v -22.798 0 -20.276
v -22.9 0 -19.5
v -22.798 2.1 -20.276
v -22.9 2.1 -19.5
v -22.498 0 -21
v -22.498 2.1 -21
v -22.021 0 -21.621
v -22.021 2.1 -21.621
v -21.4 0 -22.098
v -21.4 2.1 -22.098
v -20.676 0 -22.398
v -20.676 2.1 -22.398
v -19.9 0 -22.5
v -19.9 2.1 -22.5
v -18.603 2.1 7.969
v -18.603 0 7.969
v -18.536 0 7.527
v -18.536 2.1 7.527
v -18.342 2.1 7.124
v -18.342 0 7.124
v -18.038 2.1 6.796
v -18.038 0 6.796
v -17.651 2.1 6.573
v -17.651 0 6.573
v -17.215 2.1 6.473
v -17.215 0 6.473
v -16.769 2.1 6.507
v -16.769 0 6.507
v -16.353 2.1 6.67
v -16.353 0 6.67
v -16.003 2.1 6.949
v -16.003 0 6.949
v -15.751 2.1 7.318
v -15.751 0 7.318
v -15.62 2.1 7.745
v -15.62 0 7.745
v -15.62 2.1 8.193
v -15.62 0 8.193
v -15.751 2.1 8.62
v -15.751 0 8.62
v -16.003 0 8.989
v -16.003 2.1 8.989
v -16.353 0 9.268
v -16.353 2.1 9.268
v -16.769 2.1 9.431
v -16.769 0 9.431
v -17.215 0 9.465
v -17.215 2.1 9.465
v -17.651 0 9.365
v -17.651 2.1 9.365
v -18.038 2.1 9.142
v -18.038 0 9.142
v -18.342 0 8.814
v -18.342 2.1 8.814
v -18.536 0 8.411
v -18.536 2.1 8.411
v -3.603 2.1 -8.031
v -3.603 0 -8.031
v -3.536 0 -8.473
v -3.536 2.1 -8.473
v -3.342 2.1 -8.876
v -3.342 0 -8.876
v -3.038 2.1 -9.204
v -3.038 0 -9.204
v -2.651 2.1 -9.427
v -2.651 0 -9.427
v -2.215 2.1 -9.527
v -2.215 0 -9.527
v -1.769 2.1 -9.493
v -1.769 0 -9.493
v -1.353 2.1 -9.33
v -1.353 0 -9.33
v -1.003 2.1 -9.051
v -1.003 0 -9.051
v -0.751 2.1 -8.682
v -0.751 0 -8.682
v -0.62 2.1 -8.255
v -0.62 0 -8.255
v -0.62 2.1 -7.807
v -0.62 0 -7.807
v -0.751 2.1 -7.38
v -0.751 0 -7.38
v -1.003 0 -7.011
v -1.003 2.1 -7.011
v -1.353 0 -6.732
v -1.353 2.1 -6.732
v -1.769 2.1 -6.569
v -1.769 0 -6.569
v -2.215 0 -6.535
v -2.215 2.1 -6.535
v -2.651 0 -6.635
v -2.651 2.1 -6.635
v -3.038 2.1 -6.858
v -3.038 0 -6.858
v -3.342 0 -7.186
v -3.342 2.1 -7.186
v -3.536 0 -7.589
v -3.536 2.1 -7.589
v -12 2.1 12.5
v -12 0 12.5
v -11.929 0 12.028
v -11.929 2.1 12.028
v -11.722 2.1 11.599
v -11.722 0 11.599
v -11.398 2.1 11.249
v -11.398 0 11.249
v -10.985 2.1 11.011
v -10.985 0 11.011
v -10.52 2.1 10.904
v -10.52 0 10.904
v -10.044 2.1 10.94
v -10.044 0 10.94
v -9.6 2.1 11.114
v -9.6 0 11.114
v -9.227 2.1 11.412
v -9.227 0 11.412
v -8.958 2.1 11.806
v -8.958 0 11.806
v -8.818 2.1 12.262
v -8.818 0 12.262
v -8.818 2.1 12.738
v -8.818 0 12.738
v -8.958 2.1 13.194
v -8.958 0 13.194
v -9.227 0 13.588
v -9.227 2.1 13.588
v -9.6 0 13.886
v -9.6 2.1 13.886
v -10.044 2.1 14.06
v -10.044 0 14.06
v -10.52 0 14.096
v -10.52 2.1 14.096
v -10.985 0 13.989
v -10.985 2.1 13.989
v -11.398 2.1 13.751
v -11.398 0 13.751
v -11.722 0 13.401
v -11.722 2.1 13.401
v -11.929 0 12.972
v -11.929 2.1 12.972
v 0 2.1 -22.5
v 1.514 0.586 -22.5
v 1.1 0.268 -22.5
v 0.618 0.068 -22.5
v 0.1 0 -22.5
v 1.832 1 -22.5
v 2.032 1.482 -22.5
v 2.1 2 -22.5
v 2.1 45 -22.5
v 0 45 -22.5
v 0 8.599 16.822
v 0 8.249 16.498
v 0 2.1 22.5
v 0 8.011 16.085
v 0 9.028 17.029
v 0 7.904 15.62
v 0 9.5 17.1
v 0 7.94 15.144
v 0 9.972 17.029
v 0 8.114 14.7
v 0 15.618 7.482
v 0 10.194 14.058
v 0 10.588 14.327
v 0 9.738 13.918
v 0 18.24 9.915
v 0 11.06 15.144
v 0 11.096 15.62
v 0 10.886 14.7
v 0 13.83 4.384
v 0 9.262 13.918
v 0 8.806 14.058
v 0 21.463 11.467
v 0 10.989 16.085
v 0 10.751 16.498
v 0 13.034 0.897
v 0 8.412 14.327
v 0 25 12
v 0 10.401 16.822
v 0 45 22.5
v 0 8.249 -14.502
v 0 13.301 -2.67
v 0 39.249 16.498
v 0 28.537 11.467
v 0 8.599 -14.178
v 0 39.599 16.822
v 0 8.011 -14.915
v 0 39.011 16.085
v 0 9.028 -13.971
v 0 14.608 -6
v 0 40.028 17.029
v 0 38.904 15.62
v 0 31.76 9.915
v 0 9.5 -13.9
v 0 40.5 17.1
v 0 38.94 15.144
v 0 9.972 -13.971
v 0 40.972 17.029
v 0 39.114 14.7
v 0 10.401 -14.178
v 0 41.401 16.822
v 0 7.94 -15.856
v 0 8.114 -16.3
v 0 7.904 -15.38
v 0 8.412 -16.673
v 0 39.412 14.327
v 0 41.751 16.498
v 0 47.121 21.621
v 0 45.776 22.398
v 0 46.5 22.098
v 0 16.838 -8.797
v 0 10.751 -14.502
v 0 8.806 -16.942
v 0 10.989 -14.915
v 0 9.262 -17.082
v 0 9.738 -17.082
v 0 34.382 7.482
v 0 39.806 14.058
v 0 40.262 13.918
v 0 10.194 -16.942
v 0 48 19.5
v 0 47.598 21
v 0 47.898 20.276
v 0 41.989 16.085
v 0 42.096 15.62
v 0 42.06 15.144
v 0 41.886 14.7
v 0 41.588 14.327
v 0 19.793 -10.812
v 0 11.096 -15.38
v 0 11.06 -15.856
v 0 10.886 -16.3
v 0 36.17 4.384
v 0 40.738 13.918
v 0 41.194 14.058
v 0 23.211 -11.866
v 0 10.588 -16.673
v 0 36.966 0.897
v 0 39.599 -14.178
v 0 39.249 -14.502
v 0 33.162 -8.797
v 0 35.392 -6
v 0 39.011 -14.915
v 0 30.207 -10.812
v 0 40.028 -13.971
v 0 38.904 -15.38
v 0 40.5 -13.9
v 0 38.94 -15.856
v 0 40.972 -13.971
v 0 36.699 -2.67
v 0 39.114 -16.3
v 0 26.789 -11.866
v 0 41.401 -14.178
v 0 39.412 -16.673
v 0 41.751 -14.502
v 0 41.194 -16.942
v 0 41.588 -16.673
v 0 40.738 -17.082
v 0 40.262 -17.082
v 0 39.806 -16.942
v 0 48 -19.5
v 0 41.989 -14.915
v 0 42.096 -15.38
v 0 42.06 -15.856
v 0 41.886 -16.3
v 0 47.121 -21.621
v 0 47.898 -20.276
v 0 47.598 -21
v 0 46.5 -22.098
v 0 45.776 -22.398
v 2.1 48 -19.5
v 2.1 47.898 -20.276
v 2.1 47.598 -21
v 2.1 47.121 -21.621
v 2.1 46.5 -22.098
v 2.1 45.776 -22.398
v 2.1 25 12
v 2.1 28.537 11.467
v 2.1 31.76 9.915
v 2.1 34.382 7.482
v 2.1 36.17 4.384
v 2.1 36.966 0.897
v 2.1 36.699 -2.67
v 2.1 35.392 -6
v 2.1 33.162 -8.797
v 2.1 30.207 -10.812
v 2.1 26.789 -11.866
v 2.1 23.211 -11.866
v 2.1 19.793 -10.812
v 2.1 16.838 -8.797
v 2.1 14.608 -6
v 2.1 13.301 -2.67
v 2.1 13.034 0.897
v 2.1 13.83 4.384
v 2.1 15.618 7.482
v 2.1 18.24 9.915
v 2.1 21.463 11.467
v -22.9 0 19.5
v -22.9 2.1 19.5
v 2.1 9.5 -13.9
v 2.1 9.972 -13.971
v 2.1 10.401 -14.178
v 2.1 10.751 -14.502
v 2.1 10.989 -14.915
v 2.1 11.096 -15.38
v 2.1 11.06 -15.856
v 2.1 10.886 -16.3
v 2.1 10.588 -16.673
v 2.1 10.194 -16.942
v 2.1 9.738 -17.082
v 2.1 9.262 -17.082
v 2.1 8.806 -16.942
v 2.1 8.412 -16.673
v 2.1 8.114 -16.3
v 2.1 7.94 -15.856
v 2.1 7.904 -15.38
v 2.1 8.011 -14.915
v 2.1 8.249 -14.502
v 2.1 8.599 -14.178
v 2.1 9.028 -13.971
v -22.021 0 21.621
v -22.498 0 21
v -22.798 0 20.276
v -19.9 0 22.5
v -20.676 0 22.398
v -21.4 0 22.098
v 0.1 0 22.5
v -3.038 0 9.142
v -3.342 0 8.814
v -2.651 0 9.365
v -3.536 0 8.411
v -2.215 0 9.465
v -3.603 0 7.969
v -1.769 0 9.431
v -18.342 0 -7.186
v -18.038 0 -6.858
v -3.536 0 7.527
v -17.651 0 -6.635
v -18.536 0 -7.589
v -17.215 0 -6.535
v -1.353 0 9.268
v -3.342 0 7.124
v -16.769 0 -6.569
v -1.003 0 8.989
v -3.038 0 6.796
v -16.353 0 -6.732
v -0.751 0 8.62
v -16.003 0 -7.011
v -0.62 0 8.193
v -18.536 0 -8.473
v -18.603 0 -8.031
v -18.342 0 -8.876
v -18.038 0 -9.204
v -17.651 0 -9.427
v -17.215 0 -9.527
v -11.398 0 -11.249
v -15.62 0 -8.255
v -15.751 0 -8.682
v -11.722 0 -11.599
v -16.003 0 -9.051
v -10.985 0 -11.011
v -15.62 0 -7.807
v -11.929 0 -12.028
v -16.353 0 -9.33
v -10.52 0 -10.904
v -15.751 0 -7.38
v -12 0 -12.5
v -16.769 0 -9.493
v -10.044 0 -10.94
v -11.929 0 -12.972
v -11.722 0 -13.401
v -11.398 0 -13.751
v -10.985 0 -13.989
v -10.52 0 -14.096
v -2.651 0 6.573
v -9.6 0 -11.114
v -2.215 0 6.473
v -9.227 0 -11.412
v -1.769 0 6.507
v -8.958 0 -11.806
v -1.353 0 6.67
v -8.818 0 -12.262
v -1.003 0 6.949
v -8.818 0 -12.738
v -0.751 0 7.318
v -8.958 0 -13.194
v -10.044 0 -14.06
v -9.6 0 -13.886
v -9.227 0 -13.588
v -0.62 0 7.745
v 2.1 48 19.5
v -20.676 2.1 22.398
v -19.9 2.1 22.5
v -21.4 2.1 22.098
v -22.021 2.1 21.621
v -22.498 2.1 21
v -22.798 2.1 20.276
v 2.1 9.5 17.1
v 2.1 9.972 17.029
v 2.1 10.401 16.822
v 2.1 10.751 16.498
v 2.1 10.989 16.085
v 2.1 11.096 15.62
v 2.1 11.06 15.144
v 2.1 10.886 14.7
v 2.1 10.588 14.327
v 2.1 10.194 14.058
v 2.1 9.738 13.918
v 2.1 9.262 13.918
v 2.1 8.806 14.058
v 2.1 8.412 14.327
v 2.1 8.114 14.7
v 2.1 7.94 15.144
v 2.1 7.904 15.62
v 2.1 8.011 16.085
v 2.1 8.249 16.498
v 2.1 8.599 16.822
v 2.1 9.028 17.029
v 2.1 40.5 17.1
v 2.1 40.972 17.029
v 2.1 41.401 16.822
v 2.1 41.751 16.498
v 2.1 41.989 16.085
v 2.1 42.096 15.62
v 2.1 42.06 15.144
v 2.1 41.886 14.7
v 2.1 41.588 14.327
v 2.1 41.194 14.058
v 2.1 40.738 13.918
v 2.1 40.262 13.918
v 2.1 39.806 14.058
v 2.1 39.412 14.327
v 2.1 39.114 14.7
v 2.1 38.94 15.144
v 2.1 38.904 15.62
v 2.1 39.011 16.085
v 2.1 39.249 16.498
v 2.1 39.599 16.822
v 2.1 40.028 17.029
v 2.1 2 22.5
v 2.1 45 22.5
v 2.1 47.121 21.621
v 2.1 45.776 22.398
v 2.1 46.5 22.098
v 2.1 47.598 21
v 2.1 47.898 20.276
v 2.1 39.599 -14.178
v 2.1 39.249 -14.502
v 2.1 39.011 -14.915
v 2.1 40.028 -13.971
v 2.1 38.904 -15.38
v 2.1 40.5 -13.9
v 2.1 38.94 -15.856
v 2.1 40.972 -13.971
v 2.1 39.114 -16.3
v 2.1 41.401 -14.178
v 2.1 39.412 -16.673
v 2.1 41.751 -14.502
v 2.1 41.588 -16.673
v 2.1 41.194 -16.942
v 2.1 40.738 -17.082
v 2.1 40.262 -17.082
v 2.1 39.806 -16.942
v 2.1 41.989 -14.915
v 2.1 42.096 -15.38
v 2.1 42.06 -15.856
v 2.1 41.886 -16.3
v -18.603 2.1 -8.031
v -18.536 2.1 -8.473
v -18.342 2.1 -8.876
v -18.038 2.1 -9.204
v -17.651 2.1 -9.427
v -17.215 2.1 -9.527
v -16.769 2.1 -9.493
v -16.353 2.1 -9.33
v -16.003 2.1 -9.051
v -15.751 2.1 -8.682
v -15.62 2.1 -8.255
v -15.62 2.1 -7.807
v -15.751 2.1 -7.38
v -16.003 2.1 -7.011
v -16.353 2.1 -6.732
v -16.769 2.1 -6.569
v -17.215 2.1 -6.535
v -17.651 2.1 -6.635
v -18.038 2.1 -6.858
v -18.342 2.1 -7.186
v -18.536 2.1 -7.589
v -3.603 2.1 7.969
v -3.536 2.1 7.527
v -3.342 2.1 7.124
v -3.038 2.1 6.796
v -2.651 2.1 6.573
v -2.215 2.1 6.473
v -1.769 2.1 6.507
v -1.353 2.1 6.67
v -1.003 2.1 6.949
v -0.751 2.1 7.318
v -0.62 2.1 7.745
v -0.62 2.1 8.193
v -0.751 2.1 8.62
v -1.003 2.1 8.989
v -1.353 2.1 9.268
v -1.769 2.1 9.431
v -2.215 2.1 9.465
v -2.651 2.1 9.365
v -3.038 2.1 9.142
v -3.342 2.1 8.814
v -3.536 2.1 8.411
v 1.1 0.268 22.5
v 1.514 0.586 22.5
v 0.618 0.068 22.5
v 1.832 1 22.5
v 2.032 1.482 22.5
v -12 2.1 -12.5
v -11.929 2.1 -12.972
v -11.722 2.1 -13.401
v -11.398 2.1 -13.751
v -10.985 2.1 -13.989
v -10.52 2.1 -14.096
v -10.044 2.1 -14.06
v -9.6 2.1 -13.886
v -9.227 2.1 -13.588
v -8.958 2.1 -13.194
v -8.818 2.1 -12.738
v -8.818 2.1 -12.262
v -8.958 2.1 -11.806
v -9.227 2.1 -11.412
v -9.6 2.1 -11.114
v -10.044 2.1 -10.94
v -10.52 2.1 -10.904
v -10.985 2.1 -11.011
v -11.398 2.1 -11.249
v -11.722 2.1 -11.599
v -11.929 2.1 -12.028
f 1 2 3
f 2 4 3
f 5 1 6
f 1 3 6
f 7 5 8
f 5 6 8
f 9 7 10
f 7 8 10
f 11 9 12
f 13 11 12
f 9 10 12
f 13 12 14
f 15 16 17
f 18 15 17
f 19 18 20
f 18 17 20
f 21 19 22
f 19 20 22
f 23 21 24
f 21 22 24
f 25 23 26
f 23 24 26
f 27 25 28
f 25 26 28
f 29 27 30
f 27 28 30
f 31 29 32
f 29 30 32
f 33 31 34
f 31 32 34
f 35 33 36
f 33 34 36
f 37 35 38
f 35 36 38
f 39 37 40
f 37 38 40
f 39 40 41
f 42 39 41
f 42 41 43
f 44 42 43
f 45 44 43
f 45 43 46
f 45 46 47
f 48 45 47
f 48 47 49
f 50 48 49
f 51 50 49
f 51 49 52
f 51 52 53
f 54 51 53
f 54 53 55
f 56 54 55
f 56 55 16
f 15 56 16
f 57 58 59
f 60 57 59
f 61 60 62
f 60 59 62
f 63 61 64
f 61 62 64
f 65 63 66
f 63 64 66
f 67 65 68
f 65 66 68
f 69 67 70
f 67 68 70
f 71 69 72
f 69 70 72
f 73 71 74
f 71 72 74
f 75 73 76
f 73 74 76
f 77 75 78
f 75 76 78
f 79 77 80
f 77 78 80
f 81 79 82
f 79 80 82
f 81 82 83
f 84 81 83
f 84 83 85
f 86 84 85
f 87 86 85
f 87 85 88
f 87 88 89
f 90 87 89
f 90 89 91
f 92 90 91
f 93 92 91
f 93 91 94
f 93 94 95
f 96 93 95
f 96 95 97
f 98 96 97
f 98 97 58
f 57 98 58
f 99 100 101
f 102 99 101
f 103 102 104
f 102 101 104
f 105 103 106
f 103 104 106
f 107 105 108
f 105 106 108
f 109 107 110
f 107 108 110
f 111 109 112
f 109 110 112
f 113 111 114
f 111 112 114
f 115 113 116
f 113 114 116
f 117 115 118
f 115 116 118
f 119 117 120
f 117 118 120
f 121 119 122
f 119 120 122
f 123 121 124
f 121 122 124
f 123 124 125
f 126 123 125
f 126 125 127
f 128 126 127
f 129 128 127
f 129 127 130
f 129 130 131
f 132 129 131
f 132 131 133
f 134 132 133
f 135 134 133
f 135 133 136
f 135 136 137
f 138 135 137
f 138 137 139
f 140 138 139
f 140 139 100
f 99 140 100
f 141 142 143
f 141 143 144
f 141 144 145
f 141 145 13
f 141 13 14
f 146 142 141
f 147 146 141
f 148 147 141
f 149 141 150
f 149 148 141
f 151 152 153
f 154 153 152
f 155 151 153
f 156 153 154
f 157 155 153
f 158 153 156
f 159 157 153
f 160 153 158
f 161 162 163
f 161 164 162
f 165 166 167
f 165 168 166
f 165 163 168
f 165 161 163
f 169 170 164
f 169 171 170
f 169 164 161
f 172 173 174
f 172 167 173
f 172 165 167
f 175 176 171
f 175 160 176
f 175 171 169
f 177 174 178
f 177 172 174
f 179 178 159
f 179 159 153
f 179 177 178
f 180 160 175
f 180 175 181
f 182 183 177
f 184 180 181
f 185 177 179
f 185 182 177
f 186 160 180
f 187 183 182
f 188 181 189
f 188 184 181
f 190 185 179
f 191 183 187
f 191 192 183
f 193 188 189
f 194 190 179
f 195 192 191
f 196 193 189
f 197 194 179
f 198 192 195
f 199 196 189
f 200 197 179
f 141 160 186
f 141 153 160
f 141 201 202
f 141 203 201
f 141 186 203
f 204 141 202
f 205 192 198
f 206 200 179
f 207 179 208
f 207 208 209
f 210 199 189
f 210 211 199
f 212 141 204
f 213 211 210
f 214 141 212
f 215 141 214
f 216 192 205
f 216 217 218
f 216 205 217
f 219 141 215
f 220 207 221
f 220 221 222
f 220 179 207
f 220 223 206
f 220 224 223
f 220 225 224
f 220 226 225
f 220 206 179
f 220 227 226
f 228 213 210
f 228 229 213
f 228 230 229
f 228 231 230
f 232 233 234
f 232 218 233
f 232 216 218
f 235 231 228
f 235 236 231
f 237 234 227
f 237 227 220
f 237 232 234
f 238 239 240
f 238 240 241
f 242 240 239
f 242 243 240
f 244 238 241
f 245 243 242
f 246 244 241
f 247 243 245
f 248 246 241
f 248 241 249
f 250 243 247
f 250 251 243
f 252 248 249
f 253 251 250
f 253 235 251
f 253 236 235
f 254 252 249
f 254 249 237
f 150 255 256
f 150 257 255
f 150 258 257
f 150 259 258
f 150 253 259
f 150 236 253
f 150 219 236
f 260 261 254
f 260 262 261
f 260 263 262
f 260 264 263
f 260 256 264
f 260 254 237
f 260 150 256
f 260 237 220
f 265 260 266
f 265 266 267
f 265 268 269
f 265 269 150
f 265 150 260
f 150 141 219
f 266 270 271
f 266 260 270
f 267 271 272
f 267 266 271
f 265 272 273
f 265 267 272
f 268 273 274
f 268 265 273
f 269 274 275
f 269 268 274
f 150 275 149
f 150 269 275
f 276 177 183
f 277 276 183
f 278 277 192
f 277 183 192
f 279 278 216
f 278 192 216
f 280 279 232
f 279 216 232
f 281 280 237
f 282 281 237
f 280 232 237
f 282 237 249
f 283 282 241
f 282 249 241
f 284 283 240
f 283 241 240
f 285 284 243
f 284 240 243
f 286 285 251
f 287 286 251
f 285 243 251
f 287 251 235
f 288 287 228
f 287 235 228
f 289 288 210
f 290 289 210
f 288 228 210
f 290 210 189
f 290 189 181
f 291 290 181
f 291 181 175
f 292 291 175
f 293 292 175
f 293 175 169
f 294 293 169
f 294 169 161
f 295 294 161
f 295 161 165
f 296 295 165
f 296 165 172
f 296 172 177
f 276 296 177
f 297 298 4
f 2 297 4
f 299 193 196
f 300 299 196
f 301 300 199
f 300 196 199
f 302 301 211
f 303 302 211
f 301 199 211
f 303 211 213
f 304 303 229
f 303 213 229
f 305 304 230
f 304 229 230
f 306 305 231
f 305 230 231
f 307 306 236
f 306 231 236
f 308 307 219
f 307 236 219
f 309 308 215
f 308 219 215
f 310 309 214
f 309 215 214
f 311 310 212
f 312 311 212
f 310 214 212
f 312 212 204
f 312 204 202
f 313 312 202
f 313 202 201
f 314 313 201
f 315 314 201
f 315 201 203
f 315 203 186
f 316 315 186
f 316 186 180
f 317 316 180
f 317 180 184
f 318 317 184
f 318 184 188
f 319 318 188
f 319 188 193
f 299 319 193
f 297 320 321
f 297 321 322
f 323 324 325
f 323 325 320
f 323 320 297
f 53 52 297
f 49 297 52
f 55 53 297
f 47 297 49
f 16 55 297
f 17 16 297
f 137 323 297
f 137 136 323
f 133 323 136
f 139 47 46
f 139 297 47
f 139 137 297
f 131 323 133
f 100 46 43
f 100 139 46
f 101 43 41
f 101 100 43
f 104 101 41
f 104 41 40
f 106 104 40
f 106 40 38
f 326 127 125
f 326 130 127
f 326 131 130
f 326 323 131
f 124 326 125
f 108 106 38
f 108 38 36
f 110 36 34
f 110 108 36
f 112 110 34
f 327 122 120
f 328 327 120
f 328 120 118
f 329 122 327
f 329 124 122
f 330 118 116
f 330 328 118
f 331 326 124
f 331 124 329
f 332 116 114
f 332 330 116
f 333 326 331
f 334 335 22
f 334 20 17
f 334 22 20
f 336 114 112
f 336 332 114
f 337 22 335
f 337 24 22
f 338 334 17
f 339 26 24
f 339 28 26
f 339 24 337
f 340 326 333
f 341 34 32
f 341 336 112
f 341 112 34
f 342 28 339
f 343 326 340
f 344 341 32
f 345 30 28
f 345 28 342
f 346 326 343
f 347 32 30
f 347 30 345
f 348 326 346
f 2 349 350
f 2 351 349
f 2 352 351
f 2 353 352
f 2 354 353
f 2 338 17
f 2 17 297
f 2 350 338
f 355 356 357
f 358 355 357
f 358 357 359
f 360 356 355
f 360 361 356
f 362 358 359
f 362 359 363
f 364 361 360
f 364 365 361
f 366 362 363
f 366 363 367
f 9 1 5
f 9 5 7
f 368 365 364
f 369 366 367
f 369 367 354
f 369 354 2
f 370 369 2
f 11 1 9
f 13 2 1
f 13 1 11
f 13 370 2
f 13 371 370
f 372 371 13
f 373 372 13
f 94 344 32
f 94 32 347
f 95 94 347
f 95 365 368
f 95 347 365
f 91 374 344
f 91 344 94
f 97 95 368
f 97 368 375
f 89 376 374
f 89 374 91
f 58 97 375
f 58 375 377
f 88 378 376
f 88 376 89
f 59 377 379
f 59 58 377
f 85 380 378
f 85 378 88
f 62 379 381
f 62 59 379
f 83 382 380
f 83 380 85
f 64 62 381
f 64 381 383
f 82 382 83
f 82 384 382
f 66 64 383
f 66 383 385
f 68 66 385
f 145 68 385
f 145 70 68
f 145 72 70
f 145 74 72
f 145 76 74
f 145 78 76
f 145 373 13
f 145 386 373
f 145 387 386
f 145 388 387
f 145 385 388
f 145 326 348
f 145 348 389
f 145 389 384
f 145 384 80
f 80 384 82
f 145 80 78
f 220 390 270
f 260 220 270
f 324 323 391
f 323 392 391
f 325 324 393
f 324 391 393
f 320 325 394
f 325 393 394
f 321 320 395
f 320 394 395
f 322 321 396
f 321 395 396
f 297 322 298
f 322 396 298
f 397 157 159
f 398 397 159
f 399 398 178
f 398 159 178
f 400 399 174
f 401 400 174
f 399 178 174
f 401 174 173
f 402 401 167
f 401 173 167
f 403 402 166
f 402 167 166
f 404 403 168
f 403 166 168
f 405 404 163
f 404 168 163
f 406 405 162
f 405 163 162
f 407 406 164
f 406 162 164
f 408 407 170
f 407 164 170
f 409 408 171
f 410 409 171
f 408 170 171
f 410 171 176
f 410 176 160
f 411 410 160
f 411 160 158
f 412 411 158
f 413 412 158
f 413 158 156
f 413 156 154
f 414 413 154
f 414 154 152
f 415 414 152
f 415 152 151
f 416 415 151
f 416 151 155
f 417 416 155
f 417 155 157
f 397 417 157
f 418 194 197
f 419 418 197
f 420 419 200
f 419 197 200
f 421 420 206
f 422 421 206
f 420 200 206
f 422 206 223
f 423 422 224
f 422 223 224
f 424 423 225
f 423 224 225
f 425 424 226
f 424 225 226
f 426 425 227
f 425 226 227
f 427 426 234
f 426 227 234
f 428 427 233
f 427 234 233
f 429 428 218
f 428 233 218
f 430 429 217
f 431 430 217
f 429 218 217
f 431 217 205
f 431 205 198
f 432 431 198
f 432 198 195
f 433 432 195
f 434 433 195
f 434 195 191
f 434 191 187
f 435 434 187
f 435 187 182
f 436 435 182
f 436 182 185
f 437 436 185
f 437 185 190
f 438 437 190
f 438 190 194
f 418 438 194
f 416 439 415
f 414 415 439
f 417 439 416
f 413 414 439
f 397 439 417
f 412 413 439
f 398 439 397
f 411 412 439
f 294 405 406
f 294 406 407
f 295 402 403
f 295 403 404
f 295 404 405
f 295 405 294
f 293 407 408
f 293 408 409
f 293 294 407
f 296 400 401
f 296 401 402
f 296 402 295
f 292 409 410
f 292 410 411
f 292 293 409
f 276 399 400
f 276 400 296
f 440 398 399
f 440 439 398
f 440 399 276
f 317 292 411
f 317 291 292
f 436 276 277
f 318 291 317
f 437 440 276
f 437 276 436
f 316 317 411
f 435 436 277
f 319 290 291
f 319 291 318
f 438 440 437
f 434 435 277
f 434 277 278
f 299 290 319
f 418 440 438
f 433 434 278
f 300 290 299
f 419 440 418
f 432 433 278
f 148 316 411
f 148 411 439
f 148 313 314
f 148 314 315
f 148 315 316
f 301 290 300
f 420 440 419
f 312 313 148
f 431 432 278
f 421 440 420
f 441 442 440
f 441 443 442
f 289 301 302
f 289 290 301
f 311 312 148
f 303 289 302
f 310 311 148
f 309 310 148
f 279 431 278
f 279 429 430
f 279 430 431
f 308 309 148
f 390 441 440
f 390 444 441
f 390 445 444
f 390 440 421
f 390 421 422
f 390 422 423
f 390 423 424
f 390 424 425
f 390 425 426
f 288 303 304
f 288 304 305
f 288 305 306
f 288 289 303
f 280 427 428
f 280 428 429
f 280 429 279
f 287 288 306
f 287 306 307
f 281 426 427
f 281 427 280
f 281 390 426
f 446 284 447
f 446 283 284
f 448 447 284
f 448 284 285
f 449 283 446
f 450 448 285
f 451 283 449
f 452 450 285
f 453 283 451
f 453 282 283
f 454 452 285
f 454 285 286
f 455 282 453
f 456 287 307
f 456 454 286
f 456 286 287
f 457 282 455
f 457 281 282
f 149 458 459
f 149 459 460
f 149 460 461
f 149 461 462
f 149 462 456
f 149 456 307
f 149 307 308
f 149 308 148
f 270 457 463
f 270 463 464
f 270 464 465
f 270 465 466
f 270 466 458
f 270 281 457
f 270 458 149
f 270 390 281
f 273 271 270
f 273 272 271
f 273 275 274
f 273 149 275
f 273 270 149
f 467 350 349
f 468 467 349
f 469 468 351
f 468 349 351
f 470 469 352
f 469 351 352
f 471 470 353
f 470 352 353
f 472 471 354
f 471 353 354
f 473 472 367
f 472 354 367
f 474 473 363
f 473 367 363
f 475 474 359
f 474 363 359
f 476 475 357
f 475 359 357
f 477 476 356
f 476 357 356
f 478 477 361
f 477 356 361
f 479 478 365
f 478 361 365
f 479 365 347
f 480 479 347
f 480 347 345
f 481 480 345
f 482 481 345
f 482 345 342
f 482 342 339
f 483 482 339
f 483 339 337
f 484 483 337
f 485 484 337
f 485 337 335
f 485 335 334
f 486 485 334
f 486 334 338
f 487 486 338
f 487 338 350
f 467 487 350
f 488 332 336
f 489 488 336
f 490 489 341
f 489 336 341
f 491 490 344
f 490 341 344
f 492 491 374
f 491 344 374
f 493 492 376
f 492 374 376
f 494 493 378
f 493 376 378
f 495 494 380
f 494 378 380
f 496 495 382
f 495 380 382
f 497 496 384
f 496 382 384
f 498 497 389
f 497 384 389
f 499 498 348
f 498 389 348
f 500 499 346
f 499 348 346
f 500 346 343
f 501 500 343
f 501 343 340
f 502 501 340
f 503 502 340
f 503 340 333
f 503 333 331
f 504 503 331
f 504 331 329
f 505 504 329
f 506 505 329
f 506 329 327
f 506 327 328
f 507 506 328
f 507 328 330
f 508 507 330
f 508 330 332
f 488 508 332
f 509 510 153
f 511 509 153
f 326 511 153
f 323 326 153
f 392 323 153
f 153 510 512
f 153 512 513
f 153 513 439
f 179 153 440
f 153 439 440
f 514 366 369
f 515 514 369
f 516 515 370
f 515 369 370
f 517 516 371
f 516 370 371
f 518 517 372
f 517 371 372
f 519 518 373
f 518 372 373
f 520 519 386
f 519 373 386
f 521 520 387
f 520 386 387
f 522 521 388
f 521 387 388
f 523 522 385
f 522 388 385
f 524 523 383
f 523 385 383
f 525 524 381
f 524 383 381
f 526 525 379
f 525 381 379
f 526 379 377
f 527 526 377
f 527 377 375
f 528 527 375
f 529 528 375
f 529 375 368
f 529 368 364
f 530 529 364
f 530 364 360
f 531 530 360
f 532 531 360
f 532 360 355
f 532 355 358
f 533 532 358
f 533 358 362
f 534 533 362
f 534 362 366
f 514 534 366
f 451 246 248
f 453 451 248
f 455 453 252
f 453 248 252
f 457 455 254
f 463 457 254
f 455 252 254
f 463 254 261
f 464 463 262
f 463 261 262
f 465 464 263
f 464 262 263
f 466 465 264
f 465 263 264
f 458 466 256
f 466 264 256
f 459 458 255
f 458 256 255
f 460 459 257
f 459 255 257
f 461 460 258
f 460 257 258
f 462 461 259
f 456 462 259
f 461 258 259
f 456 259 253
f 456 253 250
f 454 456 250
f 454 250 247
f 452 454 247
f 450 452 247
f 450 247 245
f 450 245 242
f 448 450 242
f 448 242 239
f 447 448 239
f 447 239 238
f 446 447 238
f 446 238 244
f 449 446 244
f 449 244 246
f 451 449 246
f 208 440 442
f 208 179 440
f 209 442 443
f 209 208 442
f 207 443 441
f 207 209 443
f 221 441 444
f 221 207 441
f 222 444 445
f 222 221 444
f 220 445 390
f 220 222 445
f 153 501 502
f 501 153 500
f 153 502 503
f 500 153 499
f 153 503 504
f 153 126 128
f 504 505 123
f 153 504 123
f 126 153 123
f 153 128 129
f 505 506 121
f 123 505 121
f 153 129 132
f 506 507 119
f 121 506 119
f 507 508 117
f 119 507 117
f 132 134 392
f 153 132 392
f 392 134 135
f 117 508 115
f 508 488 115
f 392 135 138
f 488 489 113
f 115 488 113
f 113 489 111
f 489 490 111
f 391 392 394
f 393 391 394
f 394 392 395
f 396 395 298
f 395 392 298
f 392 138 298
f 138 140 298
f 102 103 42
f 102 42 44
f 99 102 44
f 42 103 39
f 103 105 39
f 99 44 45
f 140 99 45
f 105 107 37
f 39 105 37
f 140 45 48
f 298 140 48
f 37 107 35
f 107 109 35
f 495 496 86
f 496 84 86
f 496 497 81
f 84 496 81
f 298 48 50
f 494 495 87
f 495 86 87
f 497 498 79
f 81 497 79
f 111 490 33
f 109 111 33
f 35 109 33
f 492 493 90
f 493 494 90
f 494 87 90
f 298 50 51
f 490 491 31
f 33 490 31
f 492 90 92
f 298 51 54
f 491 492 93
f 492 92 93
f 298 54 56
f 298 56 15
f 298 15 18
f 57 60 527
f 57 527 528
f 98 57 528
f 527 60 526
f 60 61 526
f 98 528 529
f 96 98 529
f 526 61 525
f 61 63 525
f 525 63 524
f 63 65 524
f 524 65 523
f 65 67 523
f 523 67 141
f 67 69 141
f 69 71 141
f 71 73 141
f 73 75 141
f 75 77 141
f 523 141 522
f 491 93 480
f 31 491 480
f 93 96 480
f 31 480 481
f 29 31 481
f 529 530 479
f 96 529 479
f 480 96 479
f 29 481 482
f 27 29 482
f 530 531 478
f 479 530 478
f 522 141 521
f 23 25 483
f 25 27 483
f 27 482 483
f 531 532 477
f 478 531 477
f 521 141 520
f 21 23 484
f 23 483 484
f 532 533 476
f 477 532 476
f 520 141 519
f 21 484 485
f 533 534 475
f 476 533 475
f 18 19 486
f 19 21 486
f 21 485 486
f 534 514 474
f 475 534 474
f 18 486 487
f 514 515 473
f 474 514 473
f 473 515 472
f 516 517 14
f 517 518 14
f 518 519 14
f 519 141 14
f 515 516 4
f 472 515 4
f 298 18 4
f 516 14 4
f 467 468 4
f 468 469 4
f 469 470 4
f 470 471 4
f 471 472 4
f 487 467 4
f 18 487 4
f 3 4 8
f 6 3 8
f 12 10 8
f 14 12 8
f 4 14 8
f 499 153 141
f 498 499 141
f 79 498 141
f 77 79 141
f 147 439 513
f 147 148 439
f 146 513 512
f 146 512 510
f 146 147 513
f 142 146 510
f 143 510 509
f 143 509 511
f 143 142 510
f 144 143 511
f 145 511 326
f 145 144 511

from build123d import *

# Parameters (mm, degrees)
SKETCH1_W                      = 45
SKETCH1_H                      = 48
BOSS_EXTRUDE1_DEPTH            = 25
SKETCH2_W                      = 22.9
SKETCH2_H                      = 45.9
CUT_EXTRUDE1_DEPTH             = 70.666419457
F_24_0_24_DIAMETER_HOLE1_D     = 24
F_24_0_24_DIAMETER_HOLE1_DEPTH = 25
F_3_2_3_2_DIAMETER_HOLE1_D     = 3.2
F_3_2_3_2_DIAMETER_HOLE1_DEPTH = 25
F_3_2_3_2_DIAMETER_HOLE2_D     = 3.2
FILLET1_R                      = 2
FILLET2_R                      = 3
F_3_0_3_DIAMETER_HOLE1_D       = 3


with BuildPart() as part:
    # Sketch1 → Boss-Extrude1 (new body)
    with BuildSketch(Plane(origin=(2.1, 0, 0), x_dir=(0, 0, -1), z_dir=(1, 0, 0))):
        with Locations((0, 24)):
            Rectangle(SKETCH1_W, SKETCH1_H)
    extrude(amount=-BOSS_EXTRUDE1_DEPTH)

    # Sketch2 → Cut-Extrude1 (cut, through all)
    with BuildSketch(Plane(origin=(0, 0, -22.5), x_dir=(-1, 0, 0), z_dir=(0, 0, -1))):
        with Locations((11.45, 25.05)):
            Rectangle(SKETCH2_W, SKETCH2_H)
    extrude(amount=-CUT_EXTRUDE1_DEPTH, mode=Mode.SUBTRACT)

    # Ø24.0 (24) Diameter Hole1
    with Locations(Plane(origin=(2.1, 0, 0), x_dir=(0, 0, -1), z_dir=(1, 0, 0))):
        with Locations((0, 25)):
            Hole(F_24_0_24_DIAMETER_HOLE1_D / 2, depth=F_24_0_24_DIAMETER_HOLE1_DEPTH)

    # Ø3.2 (3.2) Diameter Hole1
    with Locations(Plane(origin=(2.1, 0, 0), x_dir=(0, 0, -1), z_dir=(1, 0, 0))):
        with Locations((15.5, 9.5), (-15.5, 40.5), (15.5, 40.5), (-15.5, 9.5)):
            Hole(F_3_2_3_2_DIAMETER_HOLE1_D / 2, depth=F_3_2_3_2_DIAMETER_HOLE1_DEPTH)

    # Ø3.2 (3.2) Diameter Hole2 (through all)
    with Locations(Plane(origin=(0, 2.1, 0), x_dir=(1, 0, 0), z_dir=(0, 1, 0))):
        with Locations((-10.4, 12.5), (-10.4, -12.5)):
            Hole(F_3_2_3_2_DIAMETER_HOLE2_D / 2)

    # Fillet1
    fillet1_edges = [part.edges().sort_by_distance(p)[0] for p in [
        (2.1, 0, 0),
    ]]
    fillet(fillet1_edges, radius=FILLET1_R)

    # Fillet2
    fillet2_edges = [part.edges().sort_by_distance(p)[0] for p in [
        (-22.9, 1.05, 22.5),
        (1.05, 48, -22.5),
        (1.05, 48, 22.5),
        (-22.9, 1.05, -22.5),
    ]]
    fillet(fillet2_edges, radius=FILLET2_R)

    # Ø3.0 (3) Diameter Hole1 (through all)
    with Locations(Plane(origin=(0, 2.1, 0), x_dir=(1, 0, 0), z_dir=(0, 1, 0))):
        with Locations((-2.10285259, 8.031001386), (-2.10285259, -7.968998614), (-17.10285259, 8.031001386), (-17.10285259, -7.968998614)):
            Hole(F_3_0_3_DIAMETER_HOLE1_D / 2)


solid = part.part
